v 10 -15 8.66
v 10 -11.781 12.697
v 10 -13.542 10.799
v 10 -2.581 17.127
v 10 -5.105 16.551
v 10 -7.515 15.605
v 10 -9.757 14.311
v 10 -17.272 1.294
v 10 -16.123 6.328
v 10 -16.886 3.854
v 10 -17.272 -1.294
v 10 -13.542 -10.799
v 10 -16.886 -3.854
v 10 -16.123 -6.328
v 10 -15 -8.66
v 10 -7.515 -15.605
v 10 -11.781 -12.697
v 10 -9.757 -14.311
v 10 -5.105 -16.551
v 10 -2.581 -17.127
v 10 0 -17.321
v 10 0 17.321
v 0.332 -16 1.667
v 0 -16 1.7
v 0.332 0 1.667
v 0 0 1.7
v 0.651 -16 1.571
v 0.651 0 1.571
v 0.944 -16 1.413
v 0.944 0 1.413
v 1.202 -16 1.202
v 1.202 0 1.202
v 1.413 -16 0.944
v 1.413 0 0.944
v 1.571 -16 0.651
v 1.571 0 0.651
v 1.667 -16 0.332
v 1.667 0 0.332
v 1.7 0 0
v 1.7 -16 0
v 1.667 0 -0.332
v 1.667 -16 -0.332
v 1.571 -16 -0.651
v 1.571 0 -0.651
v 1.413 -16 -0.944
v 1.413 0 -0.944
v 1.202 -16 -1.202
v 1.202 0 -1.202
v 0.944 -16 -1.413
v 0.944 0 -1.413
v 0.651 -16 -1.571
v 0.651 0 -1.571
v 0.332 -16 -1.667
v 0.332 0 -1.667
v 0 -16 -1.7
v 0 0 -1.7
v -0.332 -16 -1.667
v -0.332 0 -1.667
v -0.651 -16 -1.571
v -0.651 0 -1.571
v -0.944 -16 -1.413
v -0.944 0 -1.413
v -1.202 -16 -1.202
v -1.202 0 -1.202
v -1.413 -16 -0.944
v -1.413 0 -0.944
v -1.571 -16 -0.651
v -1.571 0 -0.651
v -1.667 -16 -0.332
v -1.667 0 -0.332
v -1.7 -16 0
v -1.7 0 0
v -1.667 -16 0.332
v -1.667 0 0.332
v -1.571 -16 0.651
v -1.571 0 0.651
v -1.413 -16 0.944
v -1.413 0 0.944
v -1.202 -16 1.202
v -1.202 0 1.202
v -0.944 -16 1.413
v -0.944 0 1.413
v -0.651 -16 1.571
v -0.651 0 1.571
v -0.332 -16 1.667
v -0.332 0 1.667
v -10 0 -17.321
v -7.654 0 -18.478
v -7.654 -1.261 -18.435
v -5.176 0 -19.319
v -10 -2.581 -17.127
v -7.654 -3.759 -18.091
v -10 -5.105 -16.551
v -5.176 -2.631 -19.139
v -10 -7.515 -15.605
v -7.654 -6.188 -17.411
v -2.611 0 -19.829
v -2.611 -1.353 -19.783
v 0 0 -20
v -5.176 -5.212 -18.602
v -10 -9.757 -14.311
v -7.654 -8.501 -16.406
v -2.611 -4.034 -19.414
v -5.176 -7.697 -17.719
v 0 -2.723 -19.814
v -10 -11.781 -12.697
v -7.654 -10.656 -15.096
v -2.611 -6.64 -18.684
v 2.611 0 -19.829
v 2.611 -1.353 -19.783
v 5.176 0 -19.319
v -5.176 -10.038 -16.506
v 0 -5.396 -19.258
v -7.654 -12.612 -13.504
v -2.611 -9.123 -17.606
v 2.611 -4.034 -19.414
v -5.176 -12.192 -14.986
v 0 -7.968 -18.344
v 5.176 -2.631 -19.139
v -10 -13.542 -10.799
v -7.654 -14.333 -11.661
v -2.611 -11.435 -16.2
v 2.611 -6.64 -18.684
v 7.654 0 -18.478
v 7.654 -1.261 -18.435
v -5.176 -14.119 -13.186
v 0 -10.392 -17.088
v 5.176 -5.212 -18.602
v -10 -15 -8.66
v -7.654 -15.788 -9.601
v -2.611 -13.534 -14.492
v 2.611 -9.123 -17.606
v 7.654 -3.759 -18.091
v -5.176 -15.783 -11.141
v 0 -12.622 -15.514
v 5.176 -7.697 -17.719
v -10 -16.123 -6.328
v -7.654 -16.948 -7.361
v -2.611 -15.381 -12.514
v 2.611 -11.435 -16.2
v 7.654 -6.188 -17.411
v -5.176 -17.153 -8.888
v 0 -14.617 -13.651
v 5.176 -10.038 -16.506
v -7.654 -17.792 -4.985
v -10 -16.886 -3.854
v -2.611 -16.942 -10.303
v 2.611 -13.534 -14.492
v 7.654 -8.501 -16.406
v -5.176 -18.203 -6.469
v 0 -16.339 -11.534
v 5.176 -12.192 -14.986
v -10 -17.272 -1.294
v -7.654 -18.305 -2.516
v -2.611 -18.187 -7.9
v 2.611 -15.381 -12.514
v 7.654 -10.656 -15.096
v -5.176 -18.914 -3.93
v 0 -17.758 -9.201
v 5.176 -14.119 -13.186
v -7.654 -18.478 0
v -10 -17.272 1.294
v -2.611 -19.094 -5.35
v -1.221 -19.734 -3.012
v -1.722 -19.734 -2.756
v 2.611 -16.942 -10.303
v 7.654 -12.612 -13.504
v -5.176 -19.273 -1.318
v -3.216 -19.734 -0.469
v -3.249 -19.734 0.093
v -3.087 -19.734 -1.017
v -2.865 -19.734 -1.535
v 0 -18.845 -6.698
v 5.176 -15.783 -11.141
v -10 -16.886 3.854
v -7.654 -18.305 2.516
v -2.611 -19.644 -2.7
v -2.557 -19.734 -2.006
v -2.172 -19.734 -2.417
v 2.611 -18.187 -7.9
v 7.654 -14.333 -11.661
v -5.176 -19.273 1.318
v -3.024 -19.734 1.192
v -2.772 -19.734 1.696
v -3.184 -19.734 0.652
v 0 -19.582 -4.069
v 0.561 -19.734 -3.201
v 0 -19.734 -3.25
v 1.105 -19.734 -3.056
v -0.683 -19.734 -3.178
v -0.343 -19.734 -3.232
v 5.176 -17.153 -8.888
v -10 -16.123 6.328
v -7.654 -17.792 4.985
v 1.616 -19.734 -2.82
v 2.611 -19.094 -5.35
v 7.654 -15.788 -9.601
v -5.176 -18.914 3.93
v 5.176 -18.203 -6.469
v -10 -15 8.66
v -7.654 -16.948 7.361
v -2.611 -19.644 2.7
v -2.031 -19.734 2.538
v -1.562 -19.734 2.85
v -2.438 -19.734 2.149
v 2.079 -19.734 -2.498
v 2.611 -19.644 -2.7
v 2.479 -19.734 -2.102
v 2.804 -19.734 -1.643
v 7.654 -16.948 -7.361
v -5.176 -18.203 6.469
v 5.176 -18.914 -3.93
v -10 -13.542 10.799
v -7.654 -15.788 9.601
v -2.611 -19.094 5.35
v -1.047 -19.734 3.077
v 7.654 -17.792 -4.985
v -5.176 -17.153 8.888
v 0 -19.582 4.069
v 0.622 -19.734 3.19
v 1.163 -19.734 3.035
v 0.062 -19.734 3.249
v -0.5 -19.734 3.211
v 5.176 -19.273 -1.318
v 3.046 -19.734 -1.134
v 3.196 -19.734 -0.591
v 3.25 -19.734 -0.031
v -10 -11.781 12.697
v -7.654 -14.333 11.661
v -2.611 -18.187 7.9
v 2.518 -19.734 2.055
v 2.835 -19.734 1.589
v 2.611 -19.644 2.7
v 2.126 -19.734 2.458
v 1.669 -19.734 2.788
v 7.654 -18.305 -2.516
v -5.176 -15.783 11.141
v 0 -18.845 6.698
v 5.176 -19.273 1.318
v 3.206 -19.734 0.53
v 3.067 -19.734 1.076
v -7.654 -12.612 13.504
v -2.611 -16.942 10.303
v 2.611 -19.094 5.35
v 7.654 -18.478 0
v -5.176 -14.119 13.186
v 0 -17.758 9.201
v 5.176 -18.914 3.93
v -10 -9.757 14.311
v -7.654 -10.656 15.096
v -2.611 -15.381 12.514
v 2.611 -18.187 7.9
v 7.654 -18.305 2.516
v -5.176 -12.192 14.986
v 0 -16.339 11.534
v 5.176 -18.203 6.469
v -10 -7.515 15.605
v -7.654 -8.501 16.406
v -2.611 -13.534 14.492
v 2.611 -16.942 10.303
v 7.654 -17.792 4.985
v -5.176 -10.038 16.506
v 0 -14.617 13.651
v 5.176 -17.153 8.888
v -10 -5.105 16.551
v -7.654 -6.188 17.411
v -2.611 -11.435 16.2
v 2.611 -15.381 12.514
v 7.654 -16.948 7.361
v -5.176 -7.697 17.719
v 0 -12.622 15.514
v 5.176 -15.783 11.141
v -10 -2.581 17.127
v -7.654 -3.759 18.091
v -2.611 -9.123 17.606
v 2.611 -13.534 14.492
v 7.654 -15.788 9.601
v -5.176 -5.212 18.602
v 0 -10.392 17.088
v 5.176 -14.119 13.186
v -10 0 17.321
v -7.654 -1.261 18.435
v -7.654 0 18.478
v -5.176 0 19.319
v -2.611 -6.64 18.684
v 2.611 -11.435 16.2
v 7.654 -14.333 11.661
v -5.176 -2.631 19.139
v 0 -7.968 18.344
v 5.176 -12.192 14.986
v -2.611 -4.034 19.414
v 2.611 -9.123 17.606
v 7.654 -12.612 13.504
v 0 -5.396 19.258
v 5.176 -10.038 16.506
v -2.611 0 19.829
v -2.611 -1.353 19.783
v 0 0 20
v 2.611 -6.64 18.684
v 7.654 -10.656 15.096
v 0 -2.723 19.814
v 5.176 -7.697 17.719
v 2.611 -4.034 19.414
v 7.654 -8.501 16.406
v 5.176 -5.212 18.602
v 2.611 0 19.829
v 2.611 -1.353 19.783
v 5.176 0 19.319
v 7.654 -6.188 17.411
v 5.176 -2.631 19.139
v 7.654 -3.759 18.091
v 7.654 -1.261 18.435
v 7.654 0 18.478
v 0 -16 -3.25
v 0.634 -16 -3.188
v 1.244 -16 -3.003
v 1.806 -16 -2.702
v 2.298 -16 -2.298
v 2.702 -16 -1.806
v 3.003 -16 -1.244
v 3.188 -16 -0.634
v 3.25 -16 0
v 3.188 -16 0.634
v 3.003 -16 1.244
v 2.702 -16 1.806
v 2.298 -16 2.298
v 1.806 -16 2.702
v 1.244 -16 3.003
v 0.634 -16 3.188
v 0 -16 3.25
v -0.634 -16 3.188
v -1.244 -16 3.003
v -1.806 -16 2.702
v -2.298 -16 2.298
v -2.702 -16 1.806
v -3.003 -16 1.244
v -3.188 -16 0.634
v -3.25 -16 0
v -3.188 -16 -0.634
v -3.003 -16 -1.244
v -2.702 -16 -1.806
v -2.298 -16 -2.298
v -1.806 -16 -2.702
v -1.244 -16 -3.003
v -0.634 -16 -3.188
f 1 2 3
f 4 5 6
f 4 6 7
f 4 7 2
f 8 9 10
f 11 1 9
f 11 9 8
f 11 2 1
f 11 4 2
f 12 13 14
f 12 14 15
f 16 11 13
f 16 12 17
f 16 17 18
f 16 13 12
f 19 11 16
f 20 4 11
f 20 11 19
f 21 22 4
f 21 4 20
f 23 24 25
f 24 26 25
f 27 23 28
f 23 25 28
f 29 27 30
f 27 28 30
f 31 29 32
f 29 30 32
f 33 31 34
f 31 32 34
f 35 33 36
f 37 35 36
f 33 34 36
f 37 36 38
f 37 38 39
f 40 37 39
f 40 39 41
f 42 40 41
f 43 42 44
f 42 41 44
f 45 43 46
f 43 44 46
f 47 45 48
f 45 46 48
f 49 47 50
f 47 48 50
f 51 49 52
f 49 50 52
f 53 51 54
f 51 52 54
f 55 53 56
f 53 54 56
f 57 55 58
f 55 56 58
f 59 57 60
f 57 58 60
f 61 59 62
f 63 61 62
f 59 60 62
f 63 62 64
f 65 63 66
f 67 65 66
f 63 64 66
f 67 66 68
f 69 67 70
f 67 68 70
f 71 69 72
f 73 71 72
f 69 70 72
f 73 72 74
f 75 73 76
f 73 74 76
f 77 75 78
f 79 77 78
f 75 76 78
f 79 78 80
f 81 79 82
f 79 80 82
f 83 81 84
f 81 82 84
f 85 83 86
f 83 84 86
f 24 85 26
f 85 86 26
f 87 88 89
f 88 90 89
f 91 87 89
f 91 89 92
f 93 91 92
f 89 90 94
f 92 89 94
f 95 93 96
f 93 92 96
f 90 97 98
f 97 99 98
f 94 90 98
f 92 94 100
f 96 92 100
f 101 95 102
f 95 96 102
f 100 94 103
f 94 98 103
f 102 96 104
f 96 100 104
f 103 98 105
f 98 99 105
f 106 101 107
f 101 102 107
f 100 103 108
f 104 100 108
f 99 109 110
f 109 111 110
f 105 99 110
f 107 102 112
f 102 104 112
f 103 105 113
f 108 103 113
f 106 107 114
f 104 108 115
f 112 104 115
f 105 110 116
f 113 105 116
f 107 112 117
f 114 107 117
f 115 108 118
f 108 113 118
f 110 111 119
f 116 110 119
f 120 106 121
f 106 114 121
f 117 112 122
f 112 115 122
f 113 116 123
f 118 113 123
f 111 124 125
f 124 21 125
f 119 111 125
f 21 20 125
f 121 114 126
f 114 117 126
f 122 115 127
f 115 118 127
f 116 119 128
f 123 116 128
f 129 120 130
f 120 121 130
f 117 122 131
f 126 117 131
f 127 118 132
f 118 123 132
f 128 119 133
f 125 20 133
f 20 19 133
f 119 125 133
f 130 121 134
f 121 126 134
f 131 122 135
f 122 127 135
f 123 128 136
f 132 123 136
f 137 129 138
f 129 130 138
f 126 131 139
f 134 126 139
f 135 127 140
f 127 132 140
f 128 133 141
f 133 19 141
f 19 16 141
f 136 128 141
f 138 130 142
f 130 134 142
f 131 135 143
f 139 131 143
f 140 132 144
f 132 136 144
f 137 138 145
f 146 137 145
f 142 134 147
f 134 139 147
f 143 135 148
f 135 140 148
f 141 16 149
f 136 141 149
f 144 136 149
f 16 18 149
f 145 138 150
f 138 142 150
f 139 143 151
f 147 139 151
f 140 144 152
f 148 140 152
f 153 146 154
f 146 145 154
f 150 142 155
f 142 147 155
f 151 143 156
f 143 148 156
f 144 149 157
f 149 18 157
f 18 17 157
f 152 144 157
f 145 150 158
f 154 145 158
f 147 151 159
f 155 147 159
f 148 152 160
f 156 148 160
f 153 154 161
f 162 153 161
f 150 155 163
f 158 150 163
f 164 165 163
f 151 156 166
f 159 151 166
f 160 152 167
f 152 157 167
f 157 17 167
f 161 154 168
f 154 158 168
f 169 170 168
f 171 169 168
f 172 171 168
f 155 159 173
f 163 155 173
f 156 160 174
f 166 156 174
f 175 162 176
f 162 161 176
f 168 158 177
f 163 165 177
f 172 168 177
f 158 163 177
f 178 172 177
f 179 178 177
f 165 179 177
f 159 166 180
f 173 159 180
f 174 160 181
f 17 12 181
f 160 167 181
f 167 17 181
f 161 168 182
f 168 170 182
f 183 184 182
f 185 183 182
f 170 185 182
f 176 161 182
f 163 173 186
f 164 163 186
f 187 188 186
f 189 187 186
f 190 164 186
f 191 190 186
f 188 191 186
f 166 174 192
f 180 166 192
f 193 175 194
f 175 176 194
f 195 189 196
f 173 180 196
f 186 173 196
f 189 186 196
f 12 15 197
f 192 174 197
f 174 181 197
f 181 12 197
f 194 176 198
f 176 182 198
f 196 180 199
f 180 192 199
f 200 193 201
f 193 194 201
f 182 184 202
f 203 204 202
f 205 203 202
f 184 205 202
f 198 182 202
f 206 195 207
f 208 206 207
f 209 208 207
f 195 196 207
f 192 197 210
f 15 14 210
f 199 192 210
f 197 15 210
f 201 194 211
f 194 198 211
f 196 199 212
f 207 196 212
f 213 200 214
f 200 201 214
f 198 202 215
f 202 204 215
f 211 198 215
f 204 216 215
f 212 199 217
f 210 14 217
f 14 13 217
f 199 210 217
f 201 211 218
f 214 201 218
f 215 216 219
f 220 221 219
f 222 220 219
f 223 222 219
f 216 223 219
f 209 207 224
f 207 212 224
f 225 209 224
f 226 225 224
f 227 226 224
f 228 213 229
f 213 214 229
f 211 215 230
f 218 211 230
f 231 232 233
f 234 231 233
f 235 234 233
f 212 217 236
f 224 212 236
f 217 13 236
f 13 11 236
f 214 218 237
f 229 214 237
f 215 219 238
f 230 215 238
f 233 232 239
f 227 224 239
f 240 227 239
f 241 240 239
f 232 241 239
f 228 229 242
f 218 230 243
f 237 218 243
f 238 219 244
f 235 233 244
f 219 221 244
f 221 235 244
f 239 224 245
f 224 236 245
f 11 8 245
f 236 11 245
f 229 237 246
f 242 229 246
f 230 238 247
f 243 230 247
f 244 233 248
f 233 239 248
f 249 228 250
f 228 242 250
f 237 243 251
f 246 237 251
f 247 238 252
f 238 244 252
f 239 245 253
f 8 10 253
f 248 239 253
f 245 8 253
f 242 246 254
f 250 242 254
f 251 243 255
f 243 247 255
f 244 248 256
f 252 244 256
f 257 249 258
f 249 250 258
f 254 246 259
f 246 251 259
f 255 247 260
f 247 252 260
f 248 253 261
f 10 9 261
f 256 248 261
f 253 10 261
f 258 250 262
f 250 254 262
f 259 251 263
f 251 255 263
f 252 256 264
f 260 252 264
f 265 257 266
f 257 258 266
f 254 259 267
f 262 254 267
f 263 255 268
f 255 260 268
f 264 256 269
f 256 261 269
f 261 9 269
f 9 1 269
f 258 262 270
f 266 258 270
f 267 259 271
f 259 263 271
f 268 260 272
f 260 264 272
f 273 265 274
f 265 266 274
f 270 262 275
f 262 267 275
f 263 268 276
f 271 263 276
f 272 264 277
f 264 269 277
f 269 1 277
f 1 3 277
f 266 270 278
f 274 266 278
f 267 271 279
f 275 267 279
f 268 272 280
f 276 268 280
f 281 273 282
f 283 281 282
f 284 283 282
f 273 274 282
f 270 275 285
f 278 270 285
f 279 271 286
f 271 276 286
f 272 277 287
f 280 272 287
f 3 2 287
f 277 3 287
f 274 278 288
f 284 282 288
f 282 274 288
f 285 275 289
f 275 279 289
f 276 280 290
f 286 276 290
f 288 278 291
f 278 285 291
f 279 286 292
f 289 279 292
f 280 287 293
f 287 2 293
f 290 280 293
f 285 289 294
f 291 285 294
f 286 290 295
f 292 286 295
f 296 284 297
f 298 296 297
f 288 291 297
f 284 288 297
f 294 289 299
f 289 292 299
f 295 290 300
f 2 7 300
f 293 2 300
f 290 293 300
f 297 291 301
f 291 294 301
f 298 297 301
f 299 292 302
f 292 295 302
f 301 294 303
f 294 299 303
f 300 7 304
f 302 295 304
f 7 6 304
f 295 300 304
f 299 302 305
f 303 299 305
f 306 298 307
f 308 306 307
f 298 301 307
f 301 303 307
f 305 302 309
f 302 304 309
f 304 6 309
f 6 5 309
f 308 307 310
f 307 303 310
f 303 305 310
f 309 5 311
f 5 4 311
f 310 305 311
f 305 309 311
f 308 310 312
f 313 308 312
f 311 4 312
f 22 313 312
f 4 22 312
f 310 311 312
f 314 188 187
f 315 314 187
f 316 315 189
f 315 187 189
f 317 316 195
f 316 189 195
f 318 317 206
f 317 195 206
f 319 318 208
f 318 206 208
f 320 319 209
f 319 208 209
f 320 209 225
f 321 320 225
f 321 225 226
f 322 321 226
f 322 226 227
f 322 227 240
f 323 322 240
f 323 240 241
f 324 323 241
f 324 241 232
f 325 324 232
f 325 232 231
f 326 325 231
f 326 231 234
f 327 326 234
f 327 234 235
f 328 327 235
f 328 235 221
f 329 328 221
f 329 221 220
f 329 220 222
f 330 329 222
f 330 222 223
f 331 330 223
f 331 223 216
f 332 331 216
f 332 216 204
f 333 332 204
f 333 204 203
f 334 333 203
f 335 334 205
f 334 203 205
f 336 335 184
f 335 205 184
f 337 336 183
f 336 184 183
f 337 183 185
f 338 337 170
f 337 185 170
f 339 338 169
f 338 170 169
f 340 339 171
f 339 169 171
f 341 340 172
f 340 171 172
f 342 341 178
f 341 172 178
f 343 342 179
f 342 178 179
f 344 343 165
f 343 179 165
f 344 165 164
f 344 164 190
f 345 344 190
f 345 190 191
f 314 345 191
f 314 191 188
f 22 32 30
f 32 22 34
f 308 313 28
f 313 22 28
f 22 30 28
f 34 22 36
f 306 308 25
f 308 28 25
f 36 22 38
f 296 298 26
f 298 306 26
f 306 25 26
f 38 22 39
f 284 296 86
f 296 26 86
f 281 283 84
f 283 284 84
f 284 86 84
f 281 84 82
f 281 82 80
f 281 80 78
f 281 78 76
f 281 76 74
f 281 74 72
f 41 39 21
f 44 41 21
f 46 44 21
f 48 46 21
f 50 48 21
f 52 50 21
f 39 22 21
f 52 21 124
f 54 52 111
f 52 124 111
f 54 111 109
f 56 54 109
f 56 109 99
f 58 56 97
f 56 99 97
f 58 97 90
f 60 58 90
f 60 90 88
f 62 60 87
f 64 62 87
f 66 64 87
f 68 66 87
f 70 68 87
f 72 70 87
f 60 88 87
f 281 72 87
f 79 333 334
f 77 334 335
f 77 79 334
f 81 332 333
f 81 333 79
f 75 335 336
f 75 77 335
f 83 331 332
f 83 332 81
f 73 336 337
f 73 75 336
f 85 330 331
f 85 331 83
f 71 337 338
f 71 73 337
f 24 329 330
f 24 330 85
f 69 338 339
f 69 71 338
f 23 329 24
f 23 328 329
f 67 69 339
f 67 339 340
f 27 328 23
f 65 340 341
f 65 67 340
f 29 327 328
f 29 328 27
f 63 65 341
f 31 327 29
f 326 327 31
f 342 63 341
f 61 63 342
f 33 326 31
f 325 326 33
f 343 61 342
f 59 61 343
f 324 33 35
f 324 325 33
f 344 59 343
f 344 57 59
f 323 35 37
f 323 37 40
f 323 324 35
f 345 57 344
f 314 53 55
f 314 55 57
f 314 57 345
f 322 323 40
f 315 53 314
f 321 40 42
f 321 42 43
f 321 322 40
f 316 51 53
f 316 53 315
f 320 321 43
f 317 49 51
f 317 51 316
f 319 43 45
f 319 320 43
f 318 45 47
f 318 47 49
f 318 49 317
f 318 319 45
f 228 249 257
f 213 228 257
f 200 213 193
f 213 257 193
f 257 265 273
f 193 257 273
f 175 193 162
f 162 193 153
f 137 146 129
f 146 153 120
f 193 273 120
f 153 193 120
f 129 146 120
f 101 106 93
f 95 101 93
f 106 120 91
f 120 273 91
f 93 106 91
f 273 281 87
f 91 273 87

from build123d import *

# Parameters (mm, degrees)
REVOLVE1_ANGLE                 = 180
SKETCH2_W                      = 20
SKETCH2_H                      = 45
CUT_EXTRUDE1_DEPTH             = 35.641016151
CBORE_FOR_M3_SHCS1_D           = 3.4
CBORE_FOR_M3_SHCS1_CBORE_D     = 6.5
CBORE_FOR_M3_SHCS1_CBORE_DEPTH = 4


with BuildPart() as part:
    # Sketch1 → Revolve1 (revolve)
    with BuildSketch(Plane(origin=(0, 0, 0), x_dir=(1, 0, 0), z_dir=(0, 1, 0))):
        with BuildLine():
            Line((20, 0), (-20, 0))
            ThreePointArc((-20, 0), (0, 20), (20, 0))
        make_face()
    revolve(axis=Axis((20, 0, 0), (-1, 0, 0)), revolution_arc=REVOLVE1_ANGLE)

    # Sketch2 → Cut-Extrude1 (cut, through all)
    with BuildSketch(Plane(origin=(0, 0, 0), x_dir=(1, 0, 0), z_dir=(0, 1, 0))):
        with Locations((-20, 0)):
            Rectangle(SKETCH2_W, SKETCH2_H)
        with Locations((20, 0)):
            Rectangle(SKETCH2_W, SKETCH2_H)
    extrude(amount=-CUT_EXTRUDE1_DEPTH, mode=Mode.SUBTRACT)

    # CBORE for M3 SHCS1 (through all)
    with Locations(Plane(origin=(0, -20, 0), x_dir=(0, 0, -1), z_dir=(0, -1, 0))):
        with Locations((0, 0)):
            CounterBoreHole(CBORE_FOR_M3_SHCS1_D / 2, CBORE_FOR_M3_SHCS1_CBORE_D / 2, CBORE_FOR_M3_SHCS1_CBORE_DEPTH)


solid = part.part
